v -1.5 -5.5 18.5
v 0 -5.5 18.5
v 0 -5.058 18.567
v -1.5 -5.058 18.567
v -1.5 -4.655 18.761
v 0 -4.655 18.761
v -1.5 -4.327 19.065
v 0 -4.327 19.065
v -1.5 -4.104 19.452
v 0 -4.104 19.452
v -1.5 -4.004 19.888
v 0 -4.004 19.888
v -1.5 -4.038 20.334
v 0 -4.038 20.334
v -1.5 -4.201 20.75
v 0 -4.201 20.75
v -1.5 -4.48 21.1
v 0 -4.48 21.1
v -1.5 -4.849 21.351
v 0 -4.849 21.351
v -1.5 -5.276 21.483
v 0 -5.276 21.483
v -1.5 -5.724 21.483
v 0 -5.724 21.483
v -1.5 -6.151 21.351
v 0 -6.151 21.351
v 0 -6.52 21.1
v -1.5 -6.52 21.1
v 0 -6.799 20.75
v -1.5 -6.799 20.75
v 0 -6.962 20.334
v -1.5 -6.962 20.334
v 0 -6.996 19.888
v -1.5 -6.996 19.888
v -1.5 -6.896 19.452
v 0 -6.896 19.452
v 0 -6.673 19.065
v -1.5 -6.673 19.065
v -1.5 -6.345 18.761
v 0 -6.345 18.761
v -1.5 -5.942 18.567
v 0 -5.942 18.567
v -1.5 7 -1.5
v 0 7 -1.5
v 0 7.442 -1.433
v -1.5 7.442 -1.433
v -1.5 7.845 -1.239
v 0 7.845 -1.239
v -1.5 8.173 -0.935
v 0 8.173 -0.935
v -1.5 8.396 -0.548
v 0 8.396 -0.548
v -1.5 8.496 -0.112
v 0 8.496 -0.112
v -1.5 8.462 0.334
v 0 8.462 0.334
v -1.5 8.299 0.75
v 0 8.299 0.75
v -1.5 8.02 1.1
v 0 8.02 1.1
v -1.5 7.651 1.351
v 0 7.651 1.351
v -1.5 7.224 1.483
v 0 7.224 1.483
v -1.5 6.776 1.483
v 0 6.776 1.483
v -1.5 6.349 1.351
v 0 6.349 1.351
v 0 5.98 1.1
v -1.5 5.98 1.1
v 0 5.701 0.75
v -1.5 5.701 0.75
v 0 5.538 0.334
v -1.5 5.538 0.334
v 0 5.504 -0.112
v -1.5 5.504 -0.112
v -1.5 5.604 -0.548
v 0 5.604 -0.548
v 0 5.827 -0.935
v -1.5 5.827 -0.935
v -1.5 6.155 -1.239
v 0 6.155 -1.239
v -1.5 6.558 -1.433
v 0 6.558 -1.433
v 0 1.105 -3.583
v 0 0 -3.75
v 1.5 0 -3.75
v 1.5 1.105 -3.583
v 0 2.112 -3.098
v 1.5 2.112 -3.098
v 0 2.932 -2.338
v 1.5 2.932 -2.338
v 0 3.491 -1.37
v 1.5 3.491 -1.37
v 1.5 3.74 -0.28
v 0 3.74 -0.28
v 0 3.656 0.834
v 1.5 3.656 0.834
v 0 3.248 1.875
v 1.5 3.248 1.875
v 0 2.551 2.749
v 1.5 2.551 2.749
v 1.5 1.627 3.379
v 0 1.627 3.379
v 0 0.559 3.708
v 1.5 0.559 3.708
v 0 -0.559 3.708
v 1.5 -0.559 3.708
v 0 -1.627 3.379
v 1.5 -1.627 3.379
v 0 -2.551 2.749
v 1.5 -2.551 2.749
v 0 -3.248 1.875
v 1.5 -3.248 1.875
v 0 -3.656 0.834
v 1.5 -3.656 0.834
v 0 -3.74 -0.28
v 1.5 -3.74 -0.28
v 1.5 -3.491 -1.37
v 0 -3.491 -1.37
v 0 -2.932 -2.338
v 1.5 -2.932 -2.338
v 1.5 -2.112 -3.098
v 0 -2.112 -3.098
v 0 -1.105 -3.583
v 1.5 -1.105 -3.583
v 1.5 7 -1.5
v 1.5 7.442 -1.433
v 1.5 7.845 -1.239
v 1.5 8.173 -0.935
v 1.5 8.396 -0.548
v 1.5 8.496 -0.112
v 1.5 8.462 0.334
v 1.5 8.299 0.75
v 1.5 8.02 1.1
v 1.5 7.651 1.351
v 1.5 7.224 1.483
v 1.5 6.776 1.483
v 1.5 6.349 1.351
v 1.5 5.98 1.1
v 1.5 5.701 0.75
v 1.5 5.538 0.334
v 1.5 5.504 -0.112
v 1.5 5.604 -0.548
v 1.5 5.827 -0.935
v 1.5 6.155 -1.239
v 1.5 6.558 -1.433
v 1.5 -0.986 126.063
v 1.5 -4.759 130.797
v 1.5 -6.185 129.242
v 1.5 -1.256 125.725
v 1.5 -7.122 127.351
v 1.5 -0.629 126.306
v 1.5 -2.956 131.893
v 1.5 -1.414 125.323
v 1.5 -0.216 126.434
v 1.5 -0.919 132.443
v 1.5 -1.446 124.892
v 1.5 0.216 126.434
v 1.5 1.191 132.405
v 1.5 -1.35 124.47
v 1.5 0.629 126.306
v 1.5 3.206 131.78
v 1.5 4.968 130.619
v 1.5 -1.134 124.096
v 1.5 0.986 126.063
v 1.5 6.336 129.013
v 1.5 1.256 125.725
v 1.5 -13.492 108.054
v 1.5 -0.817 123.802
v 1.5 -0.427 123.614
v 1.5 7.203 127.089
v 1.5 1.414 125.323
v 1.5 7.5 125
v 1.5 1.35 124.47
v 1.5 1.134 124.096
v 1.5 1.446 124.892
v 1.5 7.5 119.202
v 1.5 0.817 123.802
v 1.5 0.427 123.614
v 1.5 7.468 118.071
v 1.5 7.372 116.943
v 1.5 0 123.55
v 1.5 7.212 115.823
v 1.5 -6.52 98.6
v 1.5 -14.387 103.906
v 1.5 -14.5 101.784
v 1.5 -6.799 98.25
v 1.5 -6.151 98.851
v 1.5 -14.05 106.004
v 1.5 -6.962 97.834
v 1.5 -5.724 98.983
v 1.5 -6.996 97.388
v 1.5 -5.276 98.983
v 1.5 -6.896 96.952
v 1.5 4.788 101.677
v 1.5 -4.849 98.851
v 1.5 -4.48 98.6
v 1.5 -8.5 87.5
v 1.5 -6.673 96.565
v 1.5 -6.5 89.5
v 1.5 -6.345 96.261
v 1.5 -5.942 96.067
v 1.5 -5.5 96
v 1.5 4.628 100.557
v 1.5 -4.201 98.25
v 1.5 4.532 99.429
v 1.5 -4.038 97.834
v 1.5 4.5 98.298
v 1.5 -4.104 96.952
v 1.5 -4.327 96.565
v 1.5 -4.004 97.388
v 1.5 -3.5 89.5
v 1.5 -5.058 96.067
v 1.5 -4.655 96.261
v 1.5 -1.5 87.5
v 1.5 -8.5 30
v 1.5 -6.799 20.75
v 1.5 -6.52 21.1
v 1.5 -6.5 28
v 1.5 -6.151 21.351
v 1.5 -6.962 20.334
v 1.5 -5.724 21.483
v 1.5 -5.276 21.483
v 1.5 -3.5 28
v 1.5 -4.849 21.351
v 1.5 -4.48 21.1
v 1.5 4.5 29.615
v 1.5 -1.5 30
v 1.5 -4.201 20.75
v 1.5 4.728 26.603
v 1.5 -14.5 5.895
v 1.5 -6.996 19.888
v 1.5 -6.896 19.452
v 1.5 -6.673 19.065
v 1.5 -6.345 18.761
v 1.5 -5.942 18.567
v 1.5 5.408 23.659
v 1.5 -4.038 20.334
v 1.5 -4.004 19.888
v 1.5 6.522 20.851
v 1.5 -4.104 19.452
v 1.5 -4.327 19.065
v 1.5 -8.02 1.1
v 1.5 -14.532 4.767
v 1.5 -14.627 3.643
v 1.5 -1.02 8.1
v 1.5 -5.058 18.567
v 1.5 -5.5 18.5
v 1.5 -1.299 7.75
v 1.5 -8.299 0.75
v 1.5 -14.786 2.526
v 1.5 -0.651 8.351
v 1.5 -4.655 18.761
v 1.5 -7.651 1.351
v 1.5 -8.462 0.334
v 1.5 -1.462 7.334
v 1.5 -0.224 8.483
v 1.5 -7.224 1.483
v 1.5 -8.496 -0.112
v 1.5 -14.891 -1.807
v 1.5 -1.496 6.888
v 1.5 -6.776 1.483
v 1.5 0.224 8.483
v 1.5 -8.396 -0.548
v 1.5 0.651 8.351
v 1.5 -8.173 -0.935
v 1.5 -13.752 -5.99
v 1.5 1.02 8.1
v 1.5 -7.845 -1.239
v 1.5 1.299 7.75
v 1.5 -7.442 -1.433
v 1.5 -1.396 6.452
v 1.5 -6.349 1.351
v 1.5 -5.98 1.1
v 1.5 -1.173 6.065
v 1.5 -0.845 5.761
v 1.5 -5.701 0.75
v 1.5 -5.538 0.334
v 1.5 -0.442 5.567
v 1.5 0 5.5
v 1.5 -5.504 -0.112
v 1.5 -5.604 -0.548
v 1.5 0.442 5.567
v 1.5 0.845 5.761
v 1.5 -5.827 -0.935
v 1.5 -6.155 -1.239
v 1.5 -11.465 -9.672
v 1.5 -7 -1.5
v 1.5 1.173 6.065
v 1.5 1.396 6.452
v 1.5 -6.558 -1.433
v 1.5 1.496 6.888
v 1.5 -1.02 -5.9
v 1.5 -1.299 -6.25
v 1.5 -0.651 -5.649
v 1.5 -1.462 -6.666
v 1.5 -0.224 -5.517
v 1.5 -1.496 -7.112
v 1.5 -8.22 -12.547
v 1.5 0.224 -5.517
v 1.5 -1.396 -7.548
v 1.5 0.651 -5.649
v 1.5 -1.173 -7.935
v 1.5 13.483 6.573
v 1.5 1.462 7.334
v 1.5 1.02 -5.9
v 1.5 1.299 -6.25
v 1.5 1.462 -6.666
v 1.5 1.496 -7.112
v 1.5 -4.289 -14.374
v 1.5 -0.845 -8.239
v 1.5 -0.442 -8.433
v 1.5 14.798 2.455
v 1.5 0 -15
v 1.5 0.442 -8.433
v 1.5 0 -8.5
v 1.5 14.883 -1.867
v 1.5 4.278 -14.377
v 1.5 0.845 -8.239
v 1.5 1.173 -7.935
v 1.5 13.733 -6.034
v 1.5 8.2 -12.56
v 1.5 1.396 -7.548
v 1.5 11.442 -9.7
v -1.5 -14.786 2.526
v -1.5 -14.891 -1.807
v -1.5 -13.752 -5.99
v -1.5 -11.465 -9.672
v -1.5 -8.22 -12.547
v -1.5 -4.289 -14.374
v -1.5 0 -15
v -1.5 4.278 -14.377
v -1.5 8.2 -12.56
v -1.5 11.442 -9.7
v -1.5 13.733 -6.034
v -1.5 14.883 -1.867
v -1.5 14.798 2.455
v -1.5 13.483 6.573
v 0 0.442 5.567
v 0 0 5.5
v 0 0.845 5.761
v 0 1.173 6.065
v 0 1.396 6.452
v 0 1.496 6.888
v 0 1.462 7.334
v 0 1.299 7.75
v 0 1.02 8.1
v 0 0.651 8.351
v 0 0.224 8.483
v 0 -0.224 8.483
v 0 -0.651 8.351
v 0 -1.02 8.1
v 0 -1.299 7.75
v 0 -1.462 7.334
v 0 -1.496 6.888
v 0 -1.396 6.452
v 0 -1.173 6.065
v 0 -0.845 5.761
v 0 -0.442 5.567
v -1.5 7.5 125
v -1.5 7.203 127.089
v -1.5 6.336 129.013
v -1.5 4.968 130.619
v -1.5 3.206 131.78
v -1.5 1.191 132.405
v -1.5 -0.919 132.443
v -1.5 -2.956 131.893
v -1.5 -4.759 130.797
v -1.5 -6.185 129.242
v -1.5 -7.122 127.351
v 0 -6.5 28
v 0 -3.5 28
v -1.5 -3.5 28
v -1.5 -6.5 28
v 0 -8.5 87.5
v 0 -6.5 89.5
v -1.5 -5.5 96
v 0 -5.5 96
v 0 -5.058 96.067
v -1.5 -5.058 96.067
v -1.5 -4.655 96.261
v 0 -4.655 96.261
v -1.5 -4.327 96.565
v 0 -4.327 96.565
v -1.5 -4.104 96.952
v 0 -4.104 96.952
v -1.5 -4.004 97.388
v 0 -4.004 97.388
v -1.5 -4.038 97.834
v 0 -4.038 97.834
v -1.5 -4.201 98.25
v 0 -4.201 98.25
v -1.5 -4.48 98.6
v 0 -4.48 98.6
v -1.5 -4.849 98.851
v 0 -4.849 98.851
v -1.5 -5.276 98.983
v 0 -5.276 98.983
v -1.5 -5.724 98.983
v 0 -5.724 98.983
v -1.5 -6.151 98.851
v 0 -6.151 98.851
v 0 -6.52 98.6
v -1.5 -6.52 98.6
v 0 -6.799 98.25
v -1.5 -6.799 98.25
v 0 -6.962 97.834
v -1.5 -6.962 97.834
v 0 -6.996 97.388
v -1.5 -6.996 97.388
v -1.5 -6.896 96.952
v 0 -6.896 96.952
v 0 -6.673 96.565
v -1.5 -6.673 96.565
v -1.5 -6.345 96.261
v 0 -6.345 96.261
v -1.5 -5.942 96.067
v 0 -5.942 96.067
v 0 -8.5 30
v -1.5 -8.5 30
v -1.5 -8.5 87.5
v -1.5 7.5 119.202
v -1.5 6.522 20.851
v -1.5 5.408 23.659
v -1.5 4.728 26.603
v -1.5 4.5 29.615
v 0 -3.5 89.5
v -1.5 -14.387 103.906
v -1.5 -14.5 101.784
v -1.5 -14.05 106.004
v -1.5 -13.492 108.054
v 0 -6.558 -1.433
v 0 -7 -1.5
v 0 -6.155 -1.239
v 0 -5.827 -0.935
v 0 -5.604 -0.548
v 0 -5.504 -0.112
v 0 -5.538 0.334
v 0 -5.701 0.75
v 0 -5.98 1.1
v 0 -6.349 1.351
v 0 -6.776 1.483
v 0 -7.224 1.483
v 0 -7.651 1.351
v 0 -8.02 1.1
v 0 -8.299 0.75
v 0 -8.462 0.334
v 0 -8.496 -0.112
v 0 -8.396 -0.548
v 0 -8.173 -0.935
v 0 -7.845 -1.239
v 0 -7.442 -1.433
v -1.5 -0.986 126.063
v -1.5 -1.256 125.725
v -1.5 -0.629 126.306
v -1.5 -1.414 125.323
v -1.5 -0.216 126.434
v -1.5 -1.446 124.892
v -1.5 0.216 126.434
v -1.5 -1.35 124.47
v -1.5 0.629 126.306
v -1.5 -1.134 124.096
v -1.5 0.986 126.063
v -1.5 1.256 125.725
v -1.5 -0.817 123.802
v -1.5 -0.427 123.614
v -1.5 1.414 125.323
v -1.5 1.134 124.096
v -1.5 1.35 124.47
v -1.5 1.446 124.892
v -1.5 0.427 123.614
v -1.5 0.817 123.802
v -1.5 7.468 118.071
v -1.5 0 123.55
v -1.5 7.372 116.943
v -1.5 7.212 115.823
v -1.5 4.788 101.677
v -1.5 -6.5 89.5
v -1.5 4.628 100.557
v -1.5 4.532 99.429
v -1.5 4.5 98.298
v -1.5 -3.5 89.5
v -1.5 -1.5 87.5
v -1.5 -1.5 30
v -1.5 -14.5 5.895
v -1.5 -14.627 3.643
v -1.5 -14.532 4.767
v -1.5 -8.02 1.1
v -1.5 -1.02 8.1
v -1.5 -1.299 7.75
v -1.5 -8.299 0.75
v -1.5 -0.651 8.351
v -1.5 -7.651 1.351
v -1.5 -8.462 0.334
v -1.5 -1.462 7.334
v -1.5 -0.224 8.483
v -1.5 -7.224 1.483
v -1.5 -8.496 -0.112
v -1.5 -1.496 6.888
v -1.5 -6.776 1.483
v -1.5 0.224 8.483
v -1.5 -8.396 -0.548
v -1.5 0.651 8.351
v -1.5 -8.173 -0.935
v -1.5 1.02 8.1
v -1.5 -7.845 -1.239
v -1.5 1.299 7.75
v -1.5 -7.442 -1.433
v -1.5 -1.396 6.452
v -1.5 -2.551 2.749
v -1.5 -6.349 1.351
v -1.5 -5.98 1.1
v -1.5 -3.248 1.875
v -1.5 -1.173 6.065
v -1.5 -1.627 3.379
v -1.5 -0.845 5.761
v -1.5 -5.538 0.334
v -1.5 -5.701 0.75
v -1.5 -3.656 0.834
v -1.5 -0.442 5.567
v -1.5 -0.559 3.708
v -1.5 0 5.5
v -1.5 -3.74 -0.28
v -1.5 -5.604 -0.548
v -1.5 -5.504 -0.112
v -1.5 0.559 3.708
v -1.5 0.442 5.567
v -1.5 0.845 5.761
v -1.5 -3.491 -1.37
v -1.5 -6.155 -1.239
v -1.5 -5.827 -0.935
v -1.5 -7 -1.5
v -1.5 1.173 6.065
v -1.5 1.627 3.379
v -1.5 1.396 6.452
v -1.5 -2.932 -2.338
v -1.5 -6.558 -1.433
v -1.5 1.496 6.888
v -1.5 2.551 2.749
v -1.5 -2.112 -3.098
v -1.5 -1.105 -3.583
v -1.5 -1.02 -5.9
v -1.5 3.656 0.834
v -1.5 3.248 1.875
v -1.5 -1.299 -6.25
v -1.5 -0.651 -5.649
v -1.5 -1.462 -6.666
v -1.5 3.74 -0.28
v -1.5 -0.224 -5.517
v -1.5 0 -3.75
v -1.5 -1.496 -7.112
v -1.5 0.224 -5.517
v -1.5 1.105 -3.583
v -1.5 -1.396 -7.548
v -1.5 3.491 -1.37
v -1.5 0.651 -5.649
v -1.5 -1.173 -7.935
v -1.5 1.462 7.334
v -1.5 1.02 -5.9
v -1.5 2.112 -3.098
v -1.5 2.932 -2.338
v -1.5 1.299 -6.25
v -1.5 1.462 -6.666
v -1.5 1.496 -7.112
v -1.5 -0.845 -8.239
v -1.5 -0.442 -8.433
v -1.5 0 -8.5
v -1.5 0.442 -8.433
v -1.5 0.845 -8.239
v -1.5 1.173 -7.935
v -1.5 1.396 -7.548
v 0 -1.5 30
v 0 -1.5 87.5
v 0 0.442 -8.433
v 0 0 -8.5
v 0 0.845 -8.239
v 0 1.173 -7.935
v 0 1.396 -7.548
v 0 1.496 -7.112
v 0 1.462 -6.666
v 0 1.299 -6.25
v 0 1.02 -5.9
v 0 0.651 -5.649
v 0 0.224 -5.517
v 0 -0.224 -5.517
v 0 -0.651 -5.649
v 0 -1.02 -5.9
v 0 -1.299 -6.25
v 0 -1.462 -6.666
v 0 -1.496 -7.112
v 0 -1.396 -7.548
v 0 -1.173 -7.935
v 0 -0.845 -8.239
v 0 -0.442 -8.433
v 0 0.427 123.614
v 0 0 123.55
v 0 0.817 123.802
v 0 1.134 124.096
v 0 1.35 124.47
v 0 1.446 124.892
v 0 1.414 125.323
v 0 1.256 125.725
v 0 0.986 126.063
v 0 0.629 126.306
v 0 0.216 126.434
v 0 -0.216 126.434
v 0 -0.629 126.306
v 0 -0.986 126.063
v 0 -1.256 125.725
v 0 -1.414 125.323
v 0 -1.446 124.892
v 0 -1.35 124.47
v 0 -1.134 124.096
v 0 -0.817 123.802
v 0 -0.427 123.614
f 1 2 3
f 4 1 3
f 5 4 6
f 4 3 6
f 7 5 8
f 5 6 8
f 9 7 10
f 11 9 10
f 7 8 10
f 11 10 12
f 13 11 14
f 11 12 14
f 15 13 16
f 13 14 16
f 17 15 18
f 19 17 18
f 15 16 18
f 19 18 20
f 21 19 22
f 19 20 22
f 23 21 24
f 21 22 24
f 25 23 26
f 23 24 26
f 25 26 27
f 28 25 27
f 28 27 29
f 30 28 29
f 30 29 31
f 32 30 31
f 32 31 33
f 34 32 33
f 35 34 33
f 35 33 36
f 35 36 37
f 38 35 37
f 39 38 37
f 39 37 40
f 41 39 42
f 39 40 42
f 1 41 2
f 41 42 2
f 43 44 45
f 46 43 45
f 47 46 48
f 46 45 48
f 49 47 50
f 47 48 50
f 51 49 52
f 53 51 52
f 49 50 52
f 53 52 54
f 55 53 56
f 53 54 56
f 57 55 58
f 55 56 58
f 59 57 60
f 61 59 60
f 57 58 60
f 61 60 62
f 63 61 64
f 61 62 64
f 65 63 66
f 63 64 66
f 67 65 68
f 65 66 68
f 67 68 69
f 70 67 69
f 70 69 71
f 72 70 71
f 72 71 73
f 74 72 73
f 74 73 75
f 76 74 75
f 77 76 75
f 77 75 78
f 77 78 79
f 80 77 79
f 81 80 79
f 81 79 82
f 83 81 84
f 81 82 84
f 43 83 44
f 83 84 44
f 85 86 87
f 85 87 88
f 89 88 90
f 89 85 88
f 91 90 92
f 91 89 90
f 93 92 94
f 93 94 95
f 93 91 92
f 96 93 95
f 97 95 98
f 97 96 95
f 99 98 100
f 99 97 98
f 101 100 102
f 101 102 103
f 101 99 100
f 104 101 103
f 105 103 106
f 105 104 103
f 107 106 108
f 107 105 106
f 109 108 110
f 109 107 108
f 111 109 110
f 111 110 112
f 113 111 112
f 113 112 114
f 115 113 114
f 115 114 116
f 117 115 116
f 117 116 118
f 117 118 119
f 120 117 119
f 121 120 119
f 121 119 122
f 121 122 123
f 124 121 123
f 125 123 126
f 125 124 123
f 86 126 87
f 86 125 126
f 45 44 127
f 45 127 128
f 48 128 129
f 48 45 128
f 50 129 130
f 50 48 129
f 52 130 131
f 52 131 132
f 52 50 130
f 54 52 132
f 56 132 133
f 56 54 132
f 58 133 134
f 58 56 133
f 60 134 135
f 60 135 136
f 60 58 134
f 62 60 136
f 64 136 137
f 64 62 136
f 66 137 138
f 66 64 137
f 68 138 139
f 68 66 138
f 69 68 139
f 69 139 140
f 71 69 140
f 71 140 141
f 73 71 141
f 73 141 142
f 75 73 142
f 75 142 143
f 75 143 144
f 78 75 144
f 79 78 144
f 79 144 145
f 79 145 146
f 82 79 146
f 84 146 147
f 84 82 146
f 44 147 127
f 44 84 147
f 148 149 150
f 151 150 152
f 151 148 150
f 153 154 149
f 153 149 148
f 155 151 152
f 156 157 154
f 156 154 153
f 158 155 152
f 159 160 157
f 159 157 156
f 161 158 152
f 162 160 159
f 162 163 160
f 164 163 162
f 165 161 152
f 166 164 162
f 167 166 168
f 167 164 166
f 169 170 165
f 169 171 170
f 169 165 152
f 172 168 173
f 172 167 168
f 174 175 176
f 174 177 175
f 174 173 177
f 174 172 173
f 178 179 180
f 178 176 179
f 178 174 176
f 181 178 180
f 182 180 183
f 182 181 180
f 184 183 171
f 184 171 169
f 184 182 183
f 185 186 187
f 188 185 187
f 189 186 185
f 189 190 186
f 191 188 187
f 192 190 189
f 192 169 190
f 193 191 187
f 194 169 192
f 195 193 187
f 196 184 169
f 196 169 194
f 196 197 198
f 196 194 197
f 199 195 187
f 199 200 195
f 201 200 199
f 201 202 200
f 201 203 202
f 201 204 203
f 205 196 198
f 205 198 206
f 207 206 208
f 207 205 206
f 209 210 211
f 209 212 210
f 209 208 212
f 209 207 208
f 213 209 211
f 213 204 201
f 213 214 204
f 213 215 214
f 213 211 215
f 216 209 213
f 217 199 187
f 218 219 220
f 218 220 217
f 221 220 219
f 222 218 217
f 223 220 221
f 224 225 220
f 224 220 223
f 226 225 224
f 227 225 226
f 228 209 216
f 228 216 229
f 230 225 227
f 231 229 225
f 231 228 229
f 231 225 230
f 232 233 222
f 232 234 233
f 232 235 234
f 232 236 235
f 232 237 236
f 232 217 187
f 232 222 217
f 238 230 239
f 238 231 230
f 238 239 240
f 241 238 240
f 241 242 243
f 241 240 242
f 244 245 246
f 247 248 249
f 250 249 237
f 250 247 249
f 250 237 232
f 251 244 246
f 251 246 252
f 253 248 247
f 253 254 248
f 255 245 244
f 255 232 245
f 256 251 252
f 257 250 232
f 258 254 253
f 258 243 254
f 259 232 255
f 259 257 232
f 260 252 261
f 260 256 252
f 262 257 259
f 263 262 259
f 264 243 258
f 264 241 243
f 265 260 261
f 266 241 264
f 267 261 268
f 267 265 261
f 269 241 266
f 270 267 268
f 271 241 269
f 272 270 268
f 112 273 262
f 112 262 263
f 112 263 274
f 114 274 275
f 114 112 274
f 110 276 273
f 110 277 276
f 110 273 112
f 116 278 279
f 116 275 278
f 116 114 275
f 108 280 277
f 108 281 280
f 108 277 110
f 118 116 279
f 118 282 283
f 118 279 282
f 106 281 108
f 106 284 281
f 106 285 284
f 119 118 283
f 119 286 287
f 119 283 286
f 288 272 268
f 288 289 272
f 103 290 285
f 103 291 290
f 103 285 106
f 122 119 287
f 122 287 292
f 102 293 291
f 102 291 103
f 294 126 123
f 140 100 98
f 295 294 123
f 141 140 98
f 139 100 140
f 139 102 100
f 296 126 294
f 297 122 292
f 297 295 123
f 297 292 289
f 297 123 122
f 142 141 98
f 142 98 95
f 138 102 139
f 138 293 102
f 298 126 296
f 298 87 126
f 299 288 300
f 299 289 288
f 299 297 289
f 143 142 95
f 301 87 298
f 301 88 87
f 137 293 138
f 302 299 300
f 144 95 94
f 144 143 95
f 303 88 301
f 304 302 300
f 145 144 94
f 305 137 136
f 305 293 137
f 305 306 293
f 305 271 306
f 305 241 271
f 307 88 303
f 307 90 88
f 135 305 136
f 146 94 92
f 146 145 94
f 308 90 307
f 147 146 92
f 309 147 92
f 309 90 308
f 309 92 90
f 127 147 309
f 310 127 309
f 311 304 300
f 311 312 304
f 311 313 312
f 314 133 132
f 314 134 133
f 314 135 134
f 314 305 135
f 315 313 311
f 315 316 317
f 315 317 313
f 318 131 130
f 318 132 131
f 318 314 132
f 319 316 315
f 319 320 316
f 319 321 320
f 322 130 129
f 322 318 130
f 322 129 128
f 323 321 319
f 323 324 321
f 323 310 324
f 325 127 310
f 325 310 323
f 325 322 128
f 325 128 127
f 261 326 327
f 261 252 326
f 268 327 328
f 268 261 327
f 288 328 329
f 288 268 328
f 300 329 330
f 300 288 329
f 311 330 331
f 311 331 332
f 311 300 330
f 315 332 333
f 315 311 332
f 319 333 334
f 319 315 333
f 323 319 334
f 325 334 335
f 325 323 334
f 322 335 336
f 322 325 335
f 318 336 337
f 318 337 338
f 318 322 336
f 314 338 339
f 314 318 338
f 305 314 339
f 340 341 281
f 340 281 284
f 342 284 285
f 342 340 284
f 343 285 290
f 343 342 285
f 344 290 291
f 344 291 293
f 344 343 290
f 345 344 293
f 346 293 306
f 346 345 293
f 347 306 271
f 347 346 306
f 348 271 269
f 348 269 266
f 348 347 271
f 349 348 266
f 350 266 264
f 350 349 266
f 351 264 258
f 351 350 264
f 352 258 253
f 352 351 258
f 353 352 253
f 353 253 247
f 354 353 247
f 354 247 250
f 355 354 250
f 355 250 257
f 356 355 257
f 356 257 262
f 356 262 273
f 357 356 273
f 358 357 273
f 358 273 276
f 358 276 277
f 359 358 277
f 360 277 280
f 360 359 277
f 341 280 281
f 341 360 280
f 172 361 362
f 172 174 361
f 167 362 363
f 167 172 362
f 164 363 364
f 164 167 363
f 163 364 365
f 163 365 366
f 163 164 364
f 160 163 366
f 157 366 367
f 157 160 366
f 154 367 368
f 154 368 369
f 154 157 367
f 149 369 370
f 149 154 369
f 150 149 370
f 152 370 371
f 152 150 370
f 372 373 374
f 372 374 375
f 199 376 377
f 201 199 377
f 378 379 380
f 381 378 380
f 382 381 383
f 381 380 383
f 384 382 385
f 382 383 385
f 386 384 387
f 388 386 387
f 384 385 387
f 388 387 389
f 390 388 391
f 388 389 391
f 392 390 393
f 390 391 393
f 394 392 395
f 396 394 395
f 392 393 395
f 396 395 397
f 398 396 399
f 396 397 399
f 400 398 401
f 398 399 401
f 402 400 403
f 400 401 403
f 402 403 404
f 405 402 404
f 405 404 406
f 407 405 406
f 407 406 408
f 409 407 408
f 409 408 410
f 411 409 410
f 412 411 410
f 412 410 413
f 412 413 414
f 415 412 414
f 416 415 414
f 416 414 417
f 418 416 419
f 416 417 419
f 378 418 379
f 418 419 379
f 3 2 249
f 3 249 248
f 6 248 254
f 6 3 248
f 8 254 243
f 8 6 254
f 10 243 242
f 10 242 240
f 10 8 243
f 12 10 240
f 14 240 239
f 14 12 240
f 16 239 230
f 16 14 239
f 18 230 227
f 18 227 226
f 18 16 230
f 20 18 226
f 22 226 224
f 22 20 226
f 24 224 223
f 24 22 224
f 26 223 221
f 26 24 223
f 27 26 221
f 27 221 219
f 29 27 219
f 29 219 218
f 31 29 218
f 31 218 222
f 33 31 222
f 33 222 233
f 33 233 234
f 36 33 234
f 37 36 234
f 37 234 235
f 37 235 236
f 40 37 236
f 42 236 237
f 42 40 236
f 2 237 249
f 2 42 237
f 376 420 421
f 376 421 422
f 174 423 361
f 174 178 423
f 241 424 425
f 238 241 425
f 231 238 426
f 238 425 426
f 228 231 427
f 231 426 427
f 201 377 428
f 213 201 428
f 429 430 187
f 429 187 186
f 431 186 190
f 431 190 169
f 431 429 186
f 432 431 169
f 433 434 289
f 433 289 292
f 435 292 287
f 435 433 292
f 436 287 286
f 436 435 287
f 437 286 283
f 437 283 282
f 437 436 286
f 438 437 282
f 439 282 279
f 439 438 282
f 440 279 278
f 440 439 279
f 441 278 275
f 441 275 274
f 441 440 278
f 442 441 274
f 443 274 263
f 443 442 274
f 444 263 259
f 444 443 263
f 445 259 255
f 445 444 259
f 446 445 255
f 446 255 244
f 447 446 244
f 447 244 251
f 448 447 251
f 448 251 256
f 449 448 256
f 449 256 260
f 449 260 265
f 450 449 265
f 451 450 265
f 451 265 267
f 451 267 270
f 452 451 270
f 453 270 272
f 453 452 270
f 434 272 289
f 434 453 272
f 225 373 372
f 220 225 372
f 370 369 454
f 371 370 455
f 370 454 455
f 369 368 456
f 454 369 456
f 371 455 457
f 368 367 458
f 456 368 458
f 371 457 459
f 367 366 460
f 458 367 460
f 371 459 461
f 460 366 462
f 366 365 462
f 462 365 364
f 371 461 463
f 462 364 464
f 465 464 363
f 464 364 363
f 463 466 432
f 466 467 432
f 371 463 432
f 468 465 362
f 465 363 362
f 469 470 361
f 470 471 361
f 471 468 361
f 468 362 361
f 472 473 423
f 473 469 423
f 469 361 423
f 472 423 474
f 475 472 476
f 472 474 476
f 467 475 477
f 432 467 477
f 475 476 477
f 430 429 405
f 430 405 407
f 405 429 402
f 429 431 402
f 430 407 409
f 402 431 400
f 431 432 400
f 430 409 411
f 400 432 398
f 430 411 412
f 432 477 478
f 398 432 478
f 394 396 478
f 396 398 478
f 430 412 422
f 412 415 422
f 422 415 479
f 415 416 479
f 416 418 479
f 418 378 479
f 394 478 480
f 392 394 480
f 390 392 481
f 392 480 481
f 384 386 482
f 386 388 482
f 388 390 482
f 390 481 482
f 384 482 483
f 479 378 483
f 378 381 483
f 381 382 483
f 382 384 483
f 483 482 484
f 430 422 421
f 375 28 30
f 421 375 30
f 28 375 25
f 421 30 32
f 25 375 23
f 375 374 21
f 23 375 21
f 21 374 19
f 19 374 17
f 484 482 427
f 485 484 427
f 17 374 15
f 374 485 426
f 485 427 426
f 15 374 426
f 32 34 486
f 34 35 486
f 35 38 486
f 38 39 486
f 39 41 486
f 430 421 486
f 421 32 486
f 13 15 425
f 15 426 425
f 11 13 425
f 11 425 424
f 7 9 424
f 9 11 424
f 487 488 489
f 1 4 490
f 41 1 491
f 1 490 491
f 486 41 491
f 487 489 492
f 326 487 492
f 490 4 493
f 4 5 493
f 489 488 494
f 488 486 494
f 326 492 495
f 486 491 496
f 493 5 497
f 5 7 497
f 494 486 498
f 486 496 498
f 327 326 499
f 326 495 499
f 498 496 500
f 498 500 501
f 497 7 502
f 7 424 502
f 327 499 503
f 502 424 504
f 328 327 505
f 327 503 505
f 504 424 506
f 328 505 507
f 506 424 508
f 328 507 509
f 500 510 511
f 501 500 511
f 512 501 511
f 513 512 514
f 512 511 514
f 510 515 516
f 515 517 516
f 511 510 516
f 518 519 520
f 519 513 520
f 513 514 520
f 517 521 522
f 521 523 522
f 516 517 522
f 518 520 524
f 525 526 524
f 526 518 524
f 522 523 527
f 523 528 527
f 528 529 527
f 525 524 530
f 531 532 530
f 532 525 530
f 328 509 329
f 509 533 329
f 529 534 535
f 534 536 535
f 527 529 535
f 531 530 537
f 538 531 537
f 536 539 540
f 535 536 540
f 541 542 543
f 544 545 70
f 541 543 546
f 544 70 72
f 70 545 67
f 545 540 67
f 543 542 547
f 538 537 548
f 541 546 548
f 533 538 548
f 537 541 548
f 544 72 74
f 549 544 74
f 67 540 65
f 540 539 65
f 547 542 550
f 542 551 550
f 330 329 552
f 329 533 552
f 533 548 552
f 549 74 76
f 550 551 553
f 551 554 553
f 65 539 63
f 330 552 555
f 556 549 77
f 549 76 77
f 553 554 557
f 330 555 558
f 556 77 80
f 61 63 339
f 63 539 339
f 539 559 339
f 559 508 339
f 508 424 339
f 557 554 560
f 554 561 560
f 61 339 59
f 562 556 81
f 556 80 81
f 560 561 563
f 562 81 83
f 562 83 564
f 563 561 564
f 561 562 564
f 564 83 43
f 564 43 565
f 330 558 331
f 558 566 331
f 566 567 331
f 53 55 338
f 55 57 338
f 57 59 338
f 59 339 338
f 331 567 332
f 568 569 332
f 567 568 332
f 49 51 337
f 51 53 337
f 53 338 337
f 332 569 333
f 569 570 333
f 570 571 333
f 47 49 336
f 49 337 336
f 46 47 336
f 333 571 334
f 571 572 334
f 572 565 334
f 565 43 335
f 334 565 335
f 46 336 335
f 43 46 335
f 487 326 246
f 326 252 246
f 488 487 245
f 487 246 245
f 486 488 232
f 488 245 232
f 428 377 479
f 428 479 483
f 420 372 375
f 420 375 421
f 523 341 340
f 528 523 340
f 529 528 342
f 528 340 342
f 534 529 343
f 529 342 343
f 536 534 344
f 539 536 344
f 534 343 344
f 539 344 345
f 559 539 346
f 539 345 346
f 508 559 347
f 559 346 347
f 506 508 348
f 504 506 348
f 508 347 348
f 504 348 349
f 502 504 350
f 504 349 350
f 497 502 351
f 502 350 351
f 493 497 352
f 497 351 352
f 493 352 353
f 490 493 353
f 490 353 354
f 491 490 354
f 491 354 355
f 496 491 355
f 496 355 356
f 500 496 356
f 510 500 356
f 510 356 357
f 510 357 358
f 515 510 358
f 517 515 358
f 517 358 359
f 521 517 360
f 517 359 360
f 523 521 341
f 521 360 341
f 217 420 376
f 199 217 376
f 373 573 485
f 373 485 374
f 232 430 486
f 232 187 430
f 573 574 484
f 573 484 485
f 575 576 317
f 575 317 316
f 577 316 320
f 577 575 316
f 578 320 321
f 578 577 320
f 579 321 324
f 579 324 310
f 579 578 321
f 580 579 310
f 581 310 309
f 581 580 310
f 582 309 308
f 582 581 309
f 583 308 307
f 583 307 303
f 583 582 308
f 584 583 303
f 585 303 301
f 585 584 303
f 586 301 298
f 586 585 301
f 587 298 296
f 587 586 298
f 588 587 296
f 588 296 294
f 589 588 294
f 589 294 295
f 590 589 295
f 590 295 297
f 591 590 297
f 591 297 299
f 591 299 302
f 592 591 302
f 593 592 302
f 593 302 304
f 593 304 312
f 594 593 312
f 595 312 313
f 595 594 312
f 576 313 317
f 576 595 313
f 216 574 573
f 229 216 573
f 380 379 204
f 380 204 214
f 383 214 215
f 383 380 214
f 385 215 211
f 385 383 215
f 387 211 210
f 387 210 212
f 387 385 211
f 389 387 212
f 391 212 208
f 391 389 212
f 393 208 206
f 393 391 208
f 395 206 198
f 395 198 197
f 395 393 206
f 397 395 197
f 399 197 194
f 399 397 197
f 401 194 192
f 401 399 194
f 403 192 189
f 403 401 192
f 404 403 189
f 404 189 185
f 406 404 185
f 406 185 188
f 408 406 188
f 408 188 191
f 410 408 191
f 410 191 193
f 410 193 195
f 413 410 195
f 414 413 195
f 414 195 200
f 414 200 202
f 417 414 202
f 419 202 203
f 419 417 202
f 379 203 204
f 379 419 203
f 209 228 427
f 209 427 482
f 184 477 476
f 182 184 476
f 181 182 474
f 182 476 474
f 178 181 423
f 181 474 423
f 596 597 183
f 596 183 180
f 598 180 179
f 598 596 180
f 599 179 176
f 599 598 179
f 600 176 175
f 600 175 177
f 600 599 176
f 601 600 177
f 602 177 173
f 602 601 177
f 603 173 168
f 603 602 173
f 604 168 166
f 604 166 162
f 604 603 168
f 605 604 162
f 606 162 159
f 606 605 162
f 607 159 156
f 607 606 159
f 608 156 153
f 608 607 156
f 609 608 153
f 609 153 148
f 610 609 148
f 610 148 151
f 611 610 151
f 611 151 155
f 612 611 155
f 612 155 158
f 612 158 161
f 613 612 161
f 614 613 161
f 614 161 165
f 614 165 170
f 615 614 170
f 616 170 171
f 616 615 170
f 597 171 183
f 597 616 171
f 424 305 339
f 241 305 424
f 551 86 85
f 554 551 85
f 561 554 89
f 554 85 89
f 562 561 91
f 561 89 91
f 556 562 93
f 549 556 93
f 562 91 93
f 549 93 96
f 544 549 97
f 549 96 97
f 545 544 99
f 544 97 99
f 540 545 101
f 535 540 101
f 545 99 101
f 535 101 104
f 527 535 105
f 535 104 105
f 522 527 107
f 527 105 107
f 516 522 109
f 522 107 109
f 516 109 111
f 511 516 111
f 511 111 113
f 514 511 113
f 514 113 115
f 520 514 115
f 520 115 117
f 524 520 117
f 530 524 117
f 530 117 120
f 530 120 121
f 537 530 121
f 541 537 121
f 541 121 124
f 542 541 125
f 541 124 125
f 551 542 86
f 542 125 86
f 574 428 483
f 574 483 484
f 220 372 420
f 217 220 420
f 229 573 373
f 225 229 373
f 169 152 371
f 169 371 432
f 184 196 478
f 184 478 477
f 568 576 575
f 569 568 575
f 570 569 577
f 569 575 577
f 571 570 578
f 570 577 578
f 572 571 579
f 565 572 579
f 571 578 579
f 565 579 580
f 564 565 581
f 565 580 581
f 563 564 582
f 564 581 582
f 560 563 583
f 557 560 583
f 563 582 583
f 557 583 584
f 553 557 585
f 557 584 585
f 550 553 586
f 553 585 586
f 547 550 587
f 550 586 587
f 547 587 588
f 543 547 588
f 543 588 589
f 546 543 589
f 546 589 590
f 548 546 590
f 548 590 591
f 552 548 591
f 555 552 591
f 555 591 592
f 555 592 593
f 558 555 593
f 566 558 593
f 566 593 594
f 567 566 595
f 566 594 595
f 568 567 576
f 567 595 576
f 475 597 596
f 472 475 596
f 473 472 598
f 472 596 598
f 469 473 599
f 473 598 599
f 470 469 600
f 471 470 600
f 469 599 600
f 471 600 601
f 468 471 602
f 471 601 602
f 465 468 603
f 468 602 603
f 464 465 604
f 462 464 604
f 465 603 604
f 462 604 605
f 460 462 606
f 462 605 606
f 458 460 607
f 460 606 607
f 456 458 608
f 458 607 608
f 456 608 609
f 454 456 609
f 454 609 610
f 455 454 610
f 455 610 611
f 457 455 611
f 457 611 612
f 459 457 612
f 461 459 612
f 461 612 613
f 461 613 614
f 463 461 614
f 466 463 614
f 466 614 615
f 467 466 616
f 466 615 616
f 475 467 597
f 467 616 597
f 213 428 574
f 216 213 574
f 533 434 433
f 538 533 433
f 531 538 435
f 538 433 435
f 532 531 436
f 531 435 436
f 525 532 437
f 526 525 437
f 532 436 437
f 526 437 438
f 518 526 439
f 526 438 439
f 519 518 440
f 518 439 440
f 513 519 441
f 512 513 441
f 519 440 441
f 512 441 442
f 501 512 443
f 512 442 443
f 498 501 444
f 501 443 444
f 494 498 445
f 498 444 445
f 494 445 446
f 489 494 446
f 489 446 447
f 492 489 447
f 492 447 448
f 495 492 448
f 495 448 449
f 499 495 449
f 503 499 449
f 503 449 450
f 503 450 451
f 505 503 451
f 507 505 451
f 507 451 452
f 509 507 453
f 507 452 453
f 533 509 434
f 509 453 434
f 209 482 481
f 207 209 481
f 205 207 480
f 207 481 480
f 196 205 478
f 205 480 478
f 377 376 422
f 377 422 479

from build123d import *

# Parameters (mm, degrees)
SKETCH1_R           = 1.5
SKETCH1_R_2         = 3.75
SKETCH1_R_3         = 7.5
SKETCH1_R_4         = 1.45
BOSS_EXTRUDE1_DEPTH = 1.5
FILLET1_R           = 20


with BuildPart() as part:
    # Sketch1 → Boss-Extrude1 (new body, symmetric)
    with BuildSketch(Plane(origin=(0, 0, 0), x_dir=(0, 0, -1), z_dir=(1, 0, 0))):
        with BuildLine():
            ThreePointArc((-6.573033708, 13.483146067), (-14.928995829, -1.457766625), (-3.840572874, -14.5))
            ThreePointArc((-3.840572874, -14.5), (9.14853559, -11.887148378), (15, 0))
            ThreePointArc((15, 0), (7.9499841, 12.71997456), (-6.573033708, 13.483146067))
        make_face()
        with Locations((0, -7)):
            Circle(SKETCH1_R, mode=Mode.SUBTRACT)
        with Locations((-7, 0)):
            Circle(SKETCH1_R, mode=Mode.SUBTRACT)
        Circle(SKETCH1_R_2, mode=Mode.SUBTRACT)
        with Locations((7, 0)):
            Circle(SKETCH1_R, mode=Mode.SUBTRACT)
        with Locations((0, 7)):
            Circle(SKETCH1_R, mode=Mode.SUBTRACT)
        with BuildLine():
            Line((-127.350956164, -7.122008503), (-105, -14.5))
            Line((-105, -14.5), (-3.840572874, -14.5))
            ThreePointArc((-3.840572874, -14.5), (-14.928995829, -1.457766625), (-6.573033708, 13.483146067))
            Line((-6.573033708, 13.483146067), (-25, 4.5))
            Line((-25, 4.5), (-100, 4.5))
            Line((-100, 4.5), (-117.5, 7.5))
            Line((-117.5, 7.5), (-125, 7.5))
            ThreePointArc((-125, 7.5), (-119.696699141, 5.303300859), (-117.5, 0))
            ThreePointArc((-117.5, 0), (-120.605809018, -6.077917869), (-127.350956164, -7.122008503))
        make_face()
        with Locations((-97.5, -5.5)):
            Circle(SKETCH1_R, mode=Mode.SUBTRACT)
        Polygon((-89.5, -6.5), (-89.5, -3.5), (-87.5, -1.5), (-30, -1.5), (-28, -3.5), (-28, -6.5), (-30, -8.5), (-87.5, -8.5), align=None, mode=Mode.SUBTRACT)
        with Locations((-20, -5.5)):
            Circle(SKETCH1_R, mode=Mode.SUBTRACT)
        with Locations((-125, 0)):
            Circle(SKETCH1_R_3)
        with Locations((-125, 0)):
            Circle(SKETCH1_R_4, mode=Mode.SUBTRACT)
    extrude(amount=BOSS_EXTRUDE1_DEPTH, both=True)

    # Fillet1
    fillet1_edges = [part.edges().sort_by_distance(p)[0] for p in [
        (0.75, -14.5, 3.840572874),
        (0, -14.5, 105),
        (0, 7.5, 117.5),
        (0, 4.5, 100),
        (0, 4.5, 25),
    ]]
    fillet(fillet1_edges, radius=FILLET1_R)


solid = part.part
